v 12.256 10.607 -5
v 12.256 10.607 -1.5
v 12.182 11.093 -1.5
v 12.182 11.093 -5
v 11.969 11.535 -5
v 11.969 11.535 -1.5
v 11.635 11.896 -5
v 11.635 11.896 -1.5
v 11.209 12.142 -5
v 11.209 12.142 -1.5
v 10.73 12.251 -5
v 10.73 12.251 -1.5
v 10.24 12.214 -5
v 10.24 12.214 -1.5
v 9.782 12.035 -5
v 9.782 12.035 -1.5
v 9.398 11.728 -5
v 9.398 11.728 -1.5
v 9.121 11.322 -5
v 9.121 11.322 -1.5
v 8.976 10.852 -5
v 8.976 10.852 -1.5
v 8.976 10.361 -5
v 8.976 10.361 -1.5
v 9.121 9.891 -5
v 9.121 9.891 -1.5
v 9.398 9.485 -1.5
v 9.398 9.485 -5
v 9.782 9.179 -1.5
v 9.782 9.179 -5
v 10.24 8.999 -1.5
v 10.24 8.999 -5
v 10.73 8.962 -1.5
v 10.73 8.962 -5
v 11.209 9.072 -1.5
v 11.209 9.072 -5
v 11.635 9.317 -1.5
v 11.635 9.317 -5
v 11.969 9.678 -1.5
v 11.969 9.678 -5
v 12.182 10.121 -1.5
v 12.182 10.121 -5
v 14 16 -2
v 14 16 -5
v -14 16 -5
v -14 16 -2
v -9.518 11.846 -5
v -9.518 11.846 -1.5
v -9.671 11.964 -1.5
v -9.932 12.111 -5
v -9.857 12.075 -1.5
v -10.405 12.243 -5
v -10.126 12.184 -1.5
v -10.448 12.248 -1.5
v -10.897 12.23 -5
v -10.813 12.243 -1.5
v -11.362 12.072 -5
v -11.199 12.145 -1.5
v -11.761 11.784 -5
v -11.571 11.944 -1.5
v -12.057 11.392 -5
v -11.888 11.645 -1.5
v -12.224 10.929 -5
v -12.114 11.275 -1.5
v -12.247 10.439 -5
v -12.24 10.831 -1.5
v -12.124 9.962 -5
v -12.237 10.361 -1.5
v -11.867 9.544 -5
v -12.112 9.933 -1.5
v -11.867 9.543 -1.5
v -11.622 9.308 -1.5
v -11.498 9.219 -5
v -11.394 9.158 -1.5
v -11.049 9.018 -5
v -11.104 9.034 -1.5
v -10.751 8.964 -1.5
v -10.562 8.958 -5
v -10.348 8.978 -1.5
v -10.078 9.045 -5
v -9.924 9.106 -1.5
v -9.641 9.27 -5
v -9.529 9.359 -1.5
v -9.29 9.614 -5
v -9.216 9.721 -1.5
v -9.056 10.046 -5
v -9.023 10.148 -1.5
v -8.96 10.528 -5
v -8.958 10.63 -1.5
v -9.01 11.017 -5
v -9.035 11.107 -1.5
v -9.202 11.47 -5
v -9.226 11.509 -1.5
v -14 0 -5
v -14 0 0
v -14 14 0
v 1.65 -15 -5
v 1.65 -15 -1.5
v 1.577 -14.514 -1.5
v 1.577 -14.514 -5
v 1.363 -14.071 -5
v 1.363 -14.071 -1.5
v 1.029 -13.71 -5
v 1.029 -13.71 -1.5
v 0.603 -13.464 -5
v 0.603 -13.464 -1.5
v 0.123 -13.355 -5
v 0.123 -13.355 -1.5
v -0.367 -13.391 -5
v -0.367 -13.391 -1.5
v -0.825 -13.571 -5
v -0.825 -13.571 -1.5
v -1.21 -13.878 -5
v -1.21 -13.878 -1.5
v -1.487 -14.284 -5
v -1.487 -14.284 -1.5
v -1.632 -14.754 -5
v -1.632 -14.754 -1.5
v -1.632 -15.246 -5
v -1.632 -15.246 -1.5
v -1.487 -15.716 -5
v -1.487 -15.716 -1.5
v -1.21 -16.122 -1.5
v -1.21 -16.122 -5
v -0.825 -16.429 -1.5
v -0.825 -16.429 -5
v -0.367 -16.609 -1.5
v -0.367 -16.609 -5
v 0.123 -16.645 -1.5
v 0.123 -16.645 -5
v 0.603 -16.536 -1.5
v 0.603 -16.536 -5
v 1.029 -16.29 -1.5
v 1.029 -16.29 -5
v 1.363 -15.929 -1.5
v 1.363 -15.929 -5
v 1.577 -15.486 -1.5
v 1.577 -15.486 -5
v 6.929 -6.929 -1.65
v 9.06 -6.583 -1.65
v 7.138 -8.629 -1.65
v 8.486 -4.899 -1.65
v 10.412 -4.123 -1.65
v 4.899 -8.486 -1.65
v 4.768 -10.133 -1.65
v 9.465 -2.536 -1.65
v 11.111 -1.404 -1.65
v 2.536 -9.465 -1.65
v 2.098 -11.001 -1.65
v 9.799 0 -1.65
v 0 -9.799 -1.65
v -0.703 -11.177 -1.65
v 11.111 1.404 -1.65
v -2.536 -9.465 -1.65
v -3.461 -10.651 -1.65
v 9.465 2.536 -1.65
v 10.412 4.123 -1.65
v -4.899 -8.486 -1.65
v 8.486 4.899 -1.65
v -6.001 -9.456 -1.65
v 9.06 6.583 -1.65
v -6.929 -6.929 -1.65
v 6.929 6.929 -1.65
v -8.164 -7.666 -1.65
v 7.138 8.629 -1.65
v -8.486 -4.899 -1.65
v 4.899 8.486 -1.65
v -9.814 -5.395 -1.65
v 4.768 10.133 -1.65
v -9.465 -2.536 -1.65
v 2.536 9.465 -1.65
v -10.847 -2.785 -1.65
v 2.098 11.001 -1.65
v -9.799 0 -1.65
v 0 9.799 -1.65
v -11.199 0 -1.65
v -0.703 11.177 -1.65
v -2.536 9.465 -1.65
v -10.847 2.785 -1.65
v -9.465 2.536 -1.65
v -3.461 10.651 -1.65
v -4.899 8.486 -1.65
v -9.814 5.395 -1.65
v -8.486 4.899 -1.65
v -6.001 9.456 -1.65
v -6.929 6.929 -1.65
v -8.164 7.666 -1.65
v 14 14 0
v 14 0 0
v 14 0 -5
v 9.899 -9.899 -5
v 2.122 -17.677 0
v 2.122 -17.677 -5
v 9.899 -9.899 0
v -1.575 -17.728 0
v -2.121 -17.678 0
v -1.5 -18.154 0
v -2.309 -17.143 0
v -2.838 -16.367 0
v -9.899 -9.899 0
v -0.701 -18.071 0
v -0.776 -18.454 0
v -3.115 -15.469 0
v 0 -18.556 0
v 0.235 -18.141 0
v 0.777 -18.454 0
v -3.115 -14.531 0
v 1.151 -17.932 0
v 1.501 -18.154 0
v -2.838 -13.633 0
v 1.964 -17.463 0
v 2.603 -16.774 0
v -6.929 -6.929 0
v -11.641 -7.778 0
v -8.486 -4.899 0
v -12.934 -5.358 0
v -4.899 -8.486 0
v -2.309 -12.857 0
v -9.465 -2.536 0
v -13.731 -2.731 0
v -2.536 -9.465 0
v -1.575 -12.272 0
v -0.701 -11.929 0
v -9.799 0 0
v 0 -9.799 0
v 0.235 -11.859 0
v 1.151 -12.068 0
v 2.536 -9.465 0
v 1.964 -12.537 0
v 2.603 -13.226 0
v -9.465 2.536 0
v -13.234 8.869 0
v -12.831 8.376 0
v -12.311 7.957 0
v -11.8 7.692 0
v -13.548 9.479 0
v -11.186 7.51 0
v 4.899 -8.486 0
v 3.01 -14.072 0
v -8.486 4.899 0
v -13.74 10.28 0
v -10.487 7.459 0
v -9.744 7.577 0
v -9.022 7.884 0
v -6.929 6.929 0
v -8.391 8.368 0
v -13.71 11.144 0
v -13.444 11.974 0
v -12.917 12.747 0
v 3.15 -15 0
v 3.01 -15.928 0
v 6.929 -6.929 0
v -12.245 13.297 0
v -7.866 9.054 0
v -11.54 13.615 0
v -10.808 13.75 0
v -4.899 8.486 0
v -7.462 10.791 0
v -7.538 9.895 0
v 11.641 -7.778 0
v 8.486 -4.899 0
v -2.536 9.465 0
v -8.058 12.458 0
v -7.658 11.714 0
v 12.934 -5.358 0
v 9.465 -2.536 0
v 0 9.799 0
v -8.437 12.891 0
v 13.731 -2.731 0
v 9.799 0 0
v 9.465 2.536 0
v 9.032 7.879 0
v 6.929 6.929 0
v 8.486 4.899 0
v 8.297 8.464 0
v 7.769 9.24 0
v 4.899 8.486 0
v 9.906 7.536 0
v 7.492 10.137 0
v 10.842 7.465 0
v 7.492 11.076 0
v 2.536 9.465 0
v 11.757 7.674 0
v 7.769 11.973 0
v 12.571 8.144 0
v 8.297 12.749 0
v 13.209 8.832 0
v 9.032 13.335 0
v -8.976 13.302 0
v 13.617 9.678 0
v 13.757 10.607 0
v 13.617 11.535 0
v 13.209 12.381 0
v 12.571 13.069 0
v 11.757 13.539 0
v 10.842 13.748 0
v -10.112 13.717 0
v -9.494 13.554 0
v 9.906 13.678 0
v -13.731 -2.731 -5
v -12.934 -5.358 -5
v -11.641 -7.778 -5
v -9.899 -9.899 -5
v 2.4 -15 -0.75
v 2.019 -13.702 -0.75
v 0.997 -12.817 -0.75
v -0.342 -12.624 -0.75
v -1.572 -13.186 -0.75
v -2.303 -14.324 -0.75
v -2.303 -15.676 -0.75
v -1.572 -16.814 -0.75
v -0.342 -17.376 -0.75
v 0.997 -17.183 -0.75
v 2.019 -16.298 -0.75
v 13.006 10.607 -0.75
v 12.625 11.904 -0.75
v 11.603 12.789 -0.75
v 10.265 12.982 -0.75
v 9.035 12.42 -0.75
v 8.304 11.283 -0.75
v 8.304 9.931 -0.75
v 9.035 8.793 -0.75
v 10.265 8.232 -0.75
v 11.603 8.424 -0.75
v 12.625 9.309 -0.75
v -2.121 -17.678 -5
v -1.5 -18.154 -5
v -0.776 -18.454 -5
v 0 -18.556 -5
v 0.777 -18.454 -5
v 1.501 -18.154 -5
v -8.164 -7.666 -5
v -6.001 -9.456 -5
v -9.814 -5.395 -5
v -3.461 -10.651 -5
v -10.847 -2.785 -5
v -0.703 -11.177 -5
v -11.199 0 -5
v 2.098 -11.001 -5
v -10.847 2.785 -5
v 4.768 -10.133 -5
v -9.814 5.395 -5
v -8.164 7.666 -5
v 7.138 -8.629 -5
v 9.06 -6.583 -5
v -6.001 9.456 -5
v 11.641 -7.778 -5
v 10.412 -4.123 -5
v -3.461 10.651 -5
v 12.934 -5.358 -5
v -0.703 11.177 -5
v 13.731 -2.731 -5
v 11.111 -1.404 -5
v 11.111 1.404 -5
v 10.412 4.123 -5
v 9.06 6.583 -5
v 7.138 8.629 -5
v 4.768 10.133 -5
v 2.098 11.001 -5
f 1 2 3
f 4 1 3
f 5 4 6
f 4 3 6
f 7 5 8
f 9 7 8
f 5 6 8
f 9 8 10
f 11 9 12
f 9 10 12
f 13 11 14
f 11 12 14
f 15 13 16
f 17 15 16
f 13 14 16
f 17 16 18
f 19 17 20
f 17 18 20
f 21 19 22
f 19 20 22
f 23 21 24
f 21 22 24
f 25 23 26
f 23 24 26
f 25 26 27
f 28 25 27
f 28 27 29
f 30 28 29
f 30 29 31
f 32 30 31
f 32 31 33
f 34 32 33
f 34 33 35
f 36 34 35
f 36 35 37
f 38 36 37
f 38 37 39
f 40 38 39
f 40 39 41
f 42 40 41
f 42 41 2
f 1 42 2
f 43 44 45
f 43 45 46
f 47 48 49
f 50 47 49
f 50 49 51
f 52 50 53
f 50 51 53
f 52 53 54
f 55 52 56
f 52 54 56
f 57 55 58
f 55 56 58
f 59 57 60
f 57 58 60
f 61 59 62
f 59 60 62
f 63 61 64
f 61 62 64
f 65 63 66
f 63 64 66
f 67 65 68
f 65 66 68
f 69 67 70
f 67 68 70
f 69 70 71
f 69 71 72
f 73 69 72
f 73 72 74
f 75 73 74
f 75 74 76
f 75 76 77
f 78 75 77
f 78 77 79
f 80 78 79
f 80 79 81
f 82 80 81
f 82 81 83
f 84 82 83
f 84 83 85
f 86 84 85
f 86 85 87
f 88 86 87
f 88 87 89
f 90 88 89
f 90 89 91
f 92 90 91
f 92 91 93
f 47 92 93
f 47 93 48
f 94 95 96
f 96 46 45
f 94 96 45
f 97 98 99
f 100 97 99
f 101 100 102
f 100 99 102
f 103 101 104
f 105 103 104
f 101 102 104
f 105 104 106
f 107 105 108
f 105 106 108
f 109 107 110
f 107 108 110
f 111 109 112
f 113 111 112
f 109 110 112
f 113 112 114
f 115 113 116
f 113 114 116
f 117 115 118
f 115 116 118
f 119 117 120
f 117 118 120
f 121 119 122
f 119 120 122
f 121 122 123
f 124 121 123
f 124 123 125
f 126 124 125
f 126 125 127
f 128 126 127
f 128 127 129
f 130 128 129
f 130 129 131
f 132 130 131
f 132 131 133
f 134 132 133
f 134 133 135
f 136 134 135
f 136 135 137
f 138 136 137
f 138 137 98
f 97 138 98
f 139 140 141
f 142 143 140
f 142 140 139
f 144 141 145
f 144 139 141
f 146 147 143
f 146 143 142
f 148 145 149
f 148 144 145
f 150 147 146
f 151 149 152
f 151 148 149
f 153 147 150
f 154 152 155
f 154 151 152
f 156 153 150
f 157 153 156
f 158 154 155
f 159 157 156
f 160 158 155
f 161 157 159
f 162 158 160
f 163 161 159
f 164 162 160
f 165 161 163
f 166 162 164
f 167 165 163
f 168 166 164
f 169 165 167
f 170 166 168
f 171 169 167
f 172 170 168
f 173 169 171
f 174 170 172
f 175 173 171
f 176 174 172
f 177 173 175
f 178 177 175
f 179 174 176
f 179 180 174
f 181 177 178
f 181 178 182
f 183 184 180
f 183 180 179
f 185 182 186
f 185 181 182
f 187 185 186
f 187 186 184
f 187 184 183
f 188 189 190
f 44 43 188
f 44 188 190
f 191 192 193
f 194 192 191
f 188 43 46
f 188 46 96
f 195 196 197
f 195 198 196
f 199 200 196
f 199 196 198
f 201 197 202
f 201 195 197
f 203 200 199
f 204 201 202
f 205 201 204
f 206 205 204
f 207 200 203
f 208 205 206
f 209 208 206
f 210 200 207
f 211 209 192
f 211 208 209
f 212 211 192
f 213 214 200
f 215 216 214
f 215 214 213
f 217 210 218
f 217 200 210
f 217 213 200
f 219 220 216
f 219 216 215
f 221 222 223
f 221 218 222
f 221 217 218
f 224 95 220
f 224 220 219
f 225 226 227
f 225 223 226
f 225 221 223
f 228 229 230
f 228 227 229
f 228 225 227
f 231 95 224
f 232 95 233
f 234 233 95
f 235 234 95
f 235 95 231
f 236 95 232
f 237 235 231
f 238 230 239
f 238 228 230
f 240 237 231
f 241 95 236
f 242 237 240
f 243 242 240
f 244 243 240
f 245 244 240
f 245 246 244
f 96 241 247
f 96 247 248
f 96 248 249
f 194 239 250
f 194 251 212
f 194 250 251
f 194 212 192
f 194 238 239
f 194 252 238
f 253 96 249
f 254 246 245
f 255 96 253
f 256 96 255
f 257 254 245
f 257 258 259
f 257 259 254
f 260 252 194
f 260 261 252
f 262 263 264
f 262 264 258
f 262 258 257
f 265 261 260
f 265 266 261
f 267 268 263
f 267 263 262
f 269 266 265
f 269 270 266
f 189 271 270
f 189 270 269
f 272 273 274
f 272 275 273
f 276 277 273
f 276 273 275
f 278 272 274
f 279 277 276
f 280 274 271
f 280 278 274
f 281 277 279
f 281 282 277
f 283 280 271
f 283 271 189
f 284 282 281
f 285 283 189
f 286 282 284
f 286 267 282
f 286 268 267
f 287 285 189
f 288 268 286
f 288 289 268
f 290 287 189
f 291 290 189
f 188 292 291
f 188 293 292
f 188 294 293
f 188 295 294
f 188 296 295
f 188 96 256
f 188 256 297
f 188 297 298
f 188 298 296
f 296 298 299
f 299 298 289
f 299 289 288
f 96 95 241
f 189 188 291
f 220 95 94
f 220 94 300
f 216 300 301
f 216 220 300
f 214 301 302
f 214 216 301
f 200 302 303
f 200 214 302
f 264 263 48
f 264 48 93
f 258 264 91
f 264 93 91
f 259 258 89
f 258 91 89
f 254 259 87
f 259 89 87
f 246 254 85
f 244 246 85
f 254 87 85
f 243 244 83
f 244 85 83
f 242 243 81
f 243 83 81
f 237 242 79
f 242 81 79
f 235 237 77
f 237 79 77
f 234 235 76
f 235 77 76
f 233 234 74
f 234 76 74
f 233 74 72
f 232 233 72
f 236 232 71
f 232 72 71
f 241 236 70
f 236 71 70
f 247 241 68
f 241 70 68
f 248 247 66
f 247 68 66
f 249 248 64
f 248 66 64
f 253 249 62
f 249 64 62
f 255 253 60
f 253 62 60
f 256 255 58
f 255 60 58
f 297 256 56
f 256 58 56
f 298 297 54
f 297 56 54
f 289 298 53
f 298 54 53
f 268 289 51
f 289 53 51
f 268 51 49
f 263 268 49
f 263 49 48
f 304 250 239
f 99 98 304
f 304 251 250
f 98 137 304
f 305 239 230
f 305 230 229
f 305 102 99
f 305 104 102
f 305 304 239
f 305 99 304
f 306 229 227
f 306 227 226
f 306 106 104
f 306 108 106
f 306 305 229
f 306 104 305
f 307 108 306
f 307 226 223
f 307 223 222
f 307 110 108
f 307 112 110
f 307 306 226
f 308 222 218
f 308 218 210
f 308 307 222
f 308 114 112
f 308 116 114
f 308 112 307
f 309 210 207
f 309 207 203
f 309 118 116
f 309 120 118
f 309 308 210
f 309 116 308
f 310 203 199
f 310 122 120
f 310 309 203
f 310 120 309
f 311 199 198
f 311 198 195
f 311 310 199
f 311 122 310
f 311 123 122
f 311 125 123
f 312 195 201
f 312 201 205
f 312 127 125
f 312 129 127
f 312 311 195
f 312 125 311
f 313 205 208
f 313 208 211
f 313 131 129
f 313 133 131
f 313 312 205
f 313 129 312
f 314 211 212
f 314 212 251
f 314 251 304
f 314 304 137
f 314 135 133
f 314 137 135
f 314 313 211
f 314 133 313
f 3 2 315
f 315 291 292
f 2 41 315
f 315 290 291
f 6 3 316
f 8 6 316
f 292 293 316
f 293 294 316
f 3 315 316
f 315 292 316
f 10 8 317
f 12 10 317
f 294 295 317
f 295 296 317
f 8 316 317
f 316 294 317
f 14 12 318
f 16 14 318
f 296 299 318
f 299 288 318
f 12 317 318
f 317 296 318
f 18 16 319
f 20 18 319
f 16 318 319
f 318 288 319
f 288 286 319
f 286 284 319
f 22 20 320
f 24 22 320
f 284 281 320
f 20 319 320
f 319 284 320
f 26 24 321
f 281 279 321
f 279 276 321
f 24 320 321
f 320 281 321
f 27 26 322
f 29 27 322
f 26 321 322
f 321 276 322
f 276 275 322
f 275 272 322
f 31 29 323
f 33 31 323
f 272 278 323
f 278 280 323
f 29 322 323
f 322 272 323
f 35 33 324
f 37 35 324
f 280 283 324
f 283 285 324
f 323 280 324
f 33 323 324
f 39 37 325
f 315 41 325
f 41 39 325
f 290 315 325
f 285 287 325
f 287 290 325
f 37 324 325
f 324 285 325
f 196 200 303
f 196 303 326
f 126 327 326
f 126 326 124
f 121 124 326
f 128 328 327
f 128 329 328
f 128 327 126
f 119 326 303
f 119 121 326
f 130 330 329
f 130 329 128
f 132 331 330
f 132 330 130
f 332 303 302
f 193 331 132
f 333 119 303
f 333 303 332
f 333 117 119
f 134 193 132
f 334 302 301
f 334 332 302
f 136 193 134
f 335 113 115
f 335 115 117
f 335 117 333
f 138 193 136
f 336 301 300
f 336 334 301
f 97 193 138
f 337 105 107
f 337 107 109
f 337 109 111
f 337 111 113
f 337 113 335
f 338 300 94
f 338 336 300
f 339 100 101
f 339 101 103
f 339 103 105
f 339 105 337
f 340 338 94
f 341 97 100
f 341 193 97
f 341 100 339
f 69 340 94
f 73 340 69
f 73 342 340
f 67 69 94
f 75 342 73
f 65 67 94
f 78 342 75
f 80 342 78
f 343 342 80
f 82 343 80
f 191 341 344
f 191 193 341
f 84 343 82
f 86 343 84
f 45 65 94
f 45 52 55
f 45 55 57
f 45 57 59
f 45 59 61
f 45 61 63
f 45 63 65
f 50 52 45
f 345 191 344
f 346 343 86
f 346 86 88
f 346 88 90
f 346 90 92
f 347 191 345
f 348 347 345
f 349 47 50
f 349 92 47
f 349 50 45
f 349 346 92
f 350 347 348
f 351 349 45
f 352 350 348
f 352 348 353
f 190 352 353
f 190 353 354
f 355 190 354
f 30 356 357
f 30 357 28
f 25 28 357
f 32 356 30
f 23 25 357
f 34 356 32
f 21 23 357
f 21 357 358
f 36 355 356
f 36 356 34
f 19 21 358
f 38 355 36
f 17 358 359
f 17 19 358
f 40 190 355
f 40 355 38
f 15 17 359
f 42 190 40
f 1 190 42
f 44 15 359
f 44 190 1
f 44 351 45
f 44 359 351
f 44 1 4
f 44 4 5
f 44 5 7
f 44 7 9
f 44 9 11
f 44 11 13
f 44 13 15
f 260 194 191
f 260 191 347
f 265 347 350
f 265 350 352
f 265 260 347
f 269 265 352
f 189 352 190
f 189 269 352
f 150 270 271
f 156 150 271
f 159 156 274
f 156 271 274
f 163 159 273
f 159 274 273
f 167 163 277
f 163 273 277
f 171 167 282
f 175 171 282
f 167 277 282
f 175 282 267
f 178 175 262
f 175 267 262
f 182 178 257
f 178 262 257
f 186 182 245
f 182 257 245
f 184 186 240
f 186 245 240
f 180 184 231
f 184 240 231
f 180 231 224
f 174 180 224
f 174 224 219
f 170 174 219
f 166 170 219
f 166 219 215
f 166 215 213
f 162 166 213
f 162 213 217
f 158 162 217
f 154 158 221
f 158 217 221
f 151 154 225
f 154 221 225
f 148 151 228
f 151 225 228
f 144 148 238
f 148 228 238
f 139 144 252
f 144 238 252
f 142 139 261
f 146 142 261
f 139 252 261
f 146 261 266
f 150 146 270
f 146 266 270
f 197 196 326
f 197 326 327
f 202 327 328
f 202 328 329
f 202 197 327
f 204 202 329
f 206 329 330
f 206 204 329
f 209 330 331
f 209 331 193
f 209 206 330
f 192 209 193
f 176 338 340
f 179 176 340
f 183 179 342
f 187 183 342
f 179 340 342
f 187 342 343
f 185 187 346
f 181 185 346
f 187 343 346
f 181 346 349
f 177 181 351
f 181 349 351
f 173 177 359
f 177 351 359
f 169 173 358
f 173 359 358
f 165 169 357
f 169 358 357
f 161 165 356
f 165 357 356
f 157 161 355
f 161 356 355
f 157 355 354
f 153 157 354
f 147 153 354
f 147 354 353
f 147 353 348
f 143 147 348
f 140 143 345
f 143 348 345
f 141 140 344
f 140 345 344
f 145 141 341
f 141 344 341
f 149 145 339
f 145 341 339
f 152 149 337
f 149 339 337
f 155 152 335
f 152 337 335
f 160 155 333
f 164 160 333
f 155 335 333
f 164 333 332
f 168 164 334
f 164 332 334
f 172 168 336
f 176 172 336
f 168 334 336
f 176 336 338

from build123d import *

# Parameters (mm, degrees)
EXTRUDE_3_DEPTH     = 5
SKETCH_1_R          = 9.79888
CUT_EXTRUDE_1_DEPTH = 1.65
SKETCH_1_9_R        = 3.15
SKETCH_3_8_R        = 1.65
SKETCH_3_9_R        = 1.648905
SKETCH_3_9_R_2      = 1.65
CUT_EXTRUDE_2_DEPTH = 5
EXTRUDE_4_DEPTH     = 28
SKETCH_10_R         = 11.19888
CUT_EXTRUDE_3_DEPTH = 3.35


with BuildPart() as part:
    # 草图7 → 凸台-拉伸3 (new body)
    with BuildSketch(Plane.XY):
        with BuildLine():
            Line((14, 14), (-14, 14))
            Line((-14, 14), (-14, 0))
            ThreePointArc((-14, 0), (-12.934313455, -5.357568053), (-9.899494937, -9.899494937))
            Line((-9.899494937, -9.899494937), (-2.121320344, -17.67766953))
            ThreePointArc((-2.121320344, -17.67766953), (0.000404905, -18.556181469), (2.121892965, -17.677096908))
            Line((2.121892965, -17.677096908), (9.899494937, -9.899494937))
            ThreePointArc((9.899494937, -9.899494937), (12.934313455, -5.357568053), (14, 0))
            Line((14, 0), (14, 14))
        make_face()
    extrude(amount=-EXTRUDE_3_DEPTH)

    # 草图1 → 切除-拉伸1 (cut)
    with BuildSketch(Plane.XY):
        Circle(SKETCH_1_R)
    extrude(amount=-CUT_EXTRUDE_1_DEPTH, mode=Mode.SUBTRACT)

    # 切除-放样1: read off the stored shape, not the designer's step
    # 切除-放样1 outline → 切除-放样1 (revolve, cut)
    with BuildSketch(Plane(origin=(10.6066, 10.606603436, 0), x_dir=(1, 0, 0), z_dir=(0, -1, 0))):
        Polygon((0, 0), (0, -1.5), (1.648905, -1.5), (3.15, 0), align=None)
    revolve(axis=Axis((10.6066, 10.606603436, 0), (0, 0, 1)), mode=Mode.SUBTRACT)

    # 切除-放样2: read off the stored shape, not the designer's step
    # 切除-放样2: loft between two sections, ruled curve by curve
    loft_2_from = [
        Edge.make_bspline([(-8.058196468, 12.45812698, 0), (-4.355149378, 7.361319916, 0), (-9.451956443, 3.658272826, 0), (-13.155003532, 8.755079891, 0), (-16.858050622, 13.851886955, 0), (-11.761243557, 17.554934045, 0), (-8.058196468, 12.45812698, 0)], [0, 0, 0, 0, 0.5, 0.5, 0.5, 1, 1, 1, 1], 3, [1, 0.333333333, 0.333333333, 1, 0.333333333, 0.333333333, 1]),
    ]
    loft_2_to = [
        Edge.make_bspline([(-9.518492924, 11.845518562, -1.5), (-7.040662671, 9.669304411, -1.5), (-9.216876823, 7.191474158, -1.5), (-11.694707076, 9.367688309, -1.5), (-14.172537329, 11.543902461, -1.5), (-11.996323177, 14.021732714, -1.5), (-9.518492924, 11.845518562, -1.5)], [0, 0, 0, 0, 0.5, 0.5, 0.5, 1, 1, 1, 1], 3, [1, 0.333333333, 0.333333333, 1, 0.333333333, 0.333333333, 1]),
    ]
    loft_2 = Solid(Shell([*[Face.make_surface_from_curves(loft_2_from[k], loft_2_to[k]) for k in range(1)], Face(Wire(loft_2_from)), Face(Wire(loft_2_to))]))
    add(loft_2, mode=Mode.SUBTRACT)

    # 草图1<9> → 切除-放样3 section 0
    with BuildSketch(Plane.XY):
        with Locations((0, -14.999996564)):
            Circle(SKETCH_1_9_R)
    # 草图3<8> → 切除-放样3 section 1
    with BuildSketch(Plane.XY.offset(-1.5)):
        with Locations((0, -14.999996564)):
            Circle(SKETCH_3_8_R)
    loft(mode=Mode.SUBTRACT)

    # 草图3<9> → 切除-拉伸2 (cut)
    with BuildSketch(Plane.XY.offset(-1.5)):
        with Locations(Location((-10.6066, 10.606603436, 0), (0, 0, 48.708))):
            Circle(SKETCH_3_9_R)
        with Locations((10.6066, 10.606603436)):
            Circle(SKETCH_3_9_R)
        with Locations((0, -14.999996564)):
            Circle(SKETCH_3_9_R_2)
    extrude(amount=-CUT_EXTRUDE_2_DEPTH, mode=Mode.SUBTRACT)

    # 草图9 → 凸台-拉伸4 (add)
    with BuildSketch(Plane(origin=(14, 0, 0), x_dir=(0, 0, -1), z_dir=(1, 0, 0))):
        Polygon((5, 14), (5, 16), (2, 16), (0, 14), align=None)
    extrude(amount=-EXTRUDE_4_DEPTH)

    # 草图10 → 切除-拉伸3 (cut)
    with BuildSketch(Plane(origin=(0, 0, -5), x_dir=(-1, 0, 0), z_dir=(0, 0, -1))):
        Circle(SKETCH_10_R)
    extrude(amount=-CUT_EXTRUDE_3_DEPTH, mode=Mode.SUBTRACT)


solid = part.part
